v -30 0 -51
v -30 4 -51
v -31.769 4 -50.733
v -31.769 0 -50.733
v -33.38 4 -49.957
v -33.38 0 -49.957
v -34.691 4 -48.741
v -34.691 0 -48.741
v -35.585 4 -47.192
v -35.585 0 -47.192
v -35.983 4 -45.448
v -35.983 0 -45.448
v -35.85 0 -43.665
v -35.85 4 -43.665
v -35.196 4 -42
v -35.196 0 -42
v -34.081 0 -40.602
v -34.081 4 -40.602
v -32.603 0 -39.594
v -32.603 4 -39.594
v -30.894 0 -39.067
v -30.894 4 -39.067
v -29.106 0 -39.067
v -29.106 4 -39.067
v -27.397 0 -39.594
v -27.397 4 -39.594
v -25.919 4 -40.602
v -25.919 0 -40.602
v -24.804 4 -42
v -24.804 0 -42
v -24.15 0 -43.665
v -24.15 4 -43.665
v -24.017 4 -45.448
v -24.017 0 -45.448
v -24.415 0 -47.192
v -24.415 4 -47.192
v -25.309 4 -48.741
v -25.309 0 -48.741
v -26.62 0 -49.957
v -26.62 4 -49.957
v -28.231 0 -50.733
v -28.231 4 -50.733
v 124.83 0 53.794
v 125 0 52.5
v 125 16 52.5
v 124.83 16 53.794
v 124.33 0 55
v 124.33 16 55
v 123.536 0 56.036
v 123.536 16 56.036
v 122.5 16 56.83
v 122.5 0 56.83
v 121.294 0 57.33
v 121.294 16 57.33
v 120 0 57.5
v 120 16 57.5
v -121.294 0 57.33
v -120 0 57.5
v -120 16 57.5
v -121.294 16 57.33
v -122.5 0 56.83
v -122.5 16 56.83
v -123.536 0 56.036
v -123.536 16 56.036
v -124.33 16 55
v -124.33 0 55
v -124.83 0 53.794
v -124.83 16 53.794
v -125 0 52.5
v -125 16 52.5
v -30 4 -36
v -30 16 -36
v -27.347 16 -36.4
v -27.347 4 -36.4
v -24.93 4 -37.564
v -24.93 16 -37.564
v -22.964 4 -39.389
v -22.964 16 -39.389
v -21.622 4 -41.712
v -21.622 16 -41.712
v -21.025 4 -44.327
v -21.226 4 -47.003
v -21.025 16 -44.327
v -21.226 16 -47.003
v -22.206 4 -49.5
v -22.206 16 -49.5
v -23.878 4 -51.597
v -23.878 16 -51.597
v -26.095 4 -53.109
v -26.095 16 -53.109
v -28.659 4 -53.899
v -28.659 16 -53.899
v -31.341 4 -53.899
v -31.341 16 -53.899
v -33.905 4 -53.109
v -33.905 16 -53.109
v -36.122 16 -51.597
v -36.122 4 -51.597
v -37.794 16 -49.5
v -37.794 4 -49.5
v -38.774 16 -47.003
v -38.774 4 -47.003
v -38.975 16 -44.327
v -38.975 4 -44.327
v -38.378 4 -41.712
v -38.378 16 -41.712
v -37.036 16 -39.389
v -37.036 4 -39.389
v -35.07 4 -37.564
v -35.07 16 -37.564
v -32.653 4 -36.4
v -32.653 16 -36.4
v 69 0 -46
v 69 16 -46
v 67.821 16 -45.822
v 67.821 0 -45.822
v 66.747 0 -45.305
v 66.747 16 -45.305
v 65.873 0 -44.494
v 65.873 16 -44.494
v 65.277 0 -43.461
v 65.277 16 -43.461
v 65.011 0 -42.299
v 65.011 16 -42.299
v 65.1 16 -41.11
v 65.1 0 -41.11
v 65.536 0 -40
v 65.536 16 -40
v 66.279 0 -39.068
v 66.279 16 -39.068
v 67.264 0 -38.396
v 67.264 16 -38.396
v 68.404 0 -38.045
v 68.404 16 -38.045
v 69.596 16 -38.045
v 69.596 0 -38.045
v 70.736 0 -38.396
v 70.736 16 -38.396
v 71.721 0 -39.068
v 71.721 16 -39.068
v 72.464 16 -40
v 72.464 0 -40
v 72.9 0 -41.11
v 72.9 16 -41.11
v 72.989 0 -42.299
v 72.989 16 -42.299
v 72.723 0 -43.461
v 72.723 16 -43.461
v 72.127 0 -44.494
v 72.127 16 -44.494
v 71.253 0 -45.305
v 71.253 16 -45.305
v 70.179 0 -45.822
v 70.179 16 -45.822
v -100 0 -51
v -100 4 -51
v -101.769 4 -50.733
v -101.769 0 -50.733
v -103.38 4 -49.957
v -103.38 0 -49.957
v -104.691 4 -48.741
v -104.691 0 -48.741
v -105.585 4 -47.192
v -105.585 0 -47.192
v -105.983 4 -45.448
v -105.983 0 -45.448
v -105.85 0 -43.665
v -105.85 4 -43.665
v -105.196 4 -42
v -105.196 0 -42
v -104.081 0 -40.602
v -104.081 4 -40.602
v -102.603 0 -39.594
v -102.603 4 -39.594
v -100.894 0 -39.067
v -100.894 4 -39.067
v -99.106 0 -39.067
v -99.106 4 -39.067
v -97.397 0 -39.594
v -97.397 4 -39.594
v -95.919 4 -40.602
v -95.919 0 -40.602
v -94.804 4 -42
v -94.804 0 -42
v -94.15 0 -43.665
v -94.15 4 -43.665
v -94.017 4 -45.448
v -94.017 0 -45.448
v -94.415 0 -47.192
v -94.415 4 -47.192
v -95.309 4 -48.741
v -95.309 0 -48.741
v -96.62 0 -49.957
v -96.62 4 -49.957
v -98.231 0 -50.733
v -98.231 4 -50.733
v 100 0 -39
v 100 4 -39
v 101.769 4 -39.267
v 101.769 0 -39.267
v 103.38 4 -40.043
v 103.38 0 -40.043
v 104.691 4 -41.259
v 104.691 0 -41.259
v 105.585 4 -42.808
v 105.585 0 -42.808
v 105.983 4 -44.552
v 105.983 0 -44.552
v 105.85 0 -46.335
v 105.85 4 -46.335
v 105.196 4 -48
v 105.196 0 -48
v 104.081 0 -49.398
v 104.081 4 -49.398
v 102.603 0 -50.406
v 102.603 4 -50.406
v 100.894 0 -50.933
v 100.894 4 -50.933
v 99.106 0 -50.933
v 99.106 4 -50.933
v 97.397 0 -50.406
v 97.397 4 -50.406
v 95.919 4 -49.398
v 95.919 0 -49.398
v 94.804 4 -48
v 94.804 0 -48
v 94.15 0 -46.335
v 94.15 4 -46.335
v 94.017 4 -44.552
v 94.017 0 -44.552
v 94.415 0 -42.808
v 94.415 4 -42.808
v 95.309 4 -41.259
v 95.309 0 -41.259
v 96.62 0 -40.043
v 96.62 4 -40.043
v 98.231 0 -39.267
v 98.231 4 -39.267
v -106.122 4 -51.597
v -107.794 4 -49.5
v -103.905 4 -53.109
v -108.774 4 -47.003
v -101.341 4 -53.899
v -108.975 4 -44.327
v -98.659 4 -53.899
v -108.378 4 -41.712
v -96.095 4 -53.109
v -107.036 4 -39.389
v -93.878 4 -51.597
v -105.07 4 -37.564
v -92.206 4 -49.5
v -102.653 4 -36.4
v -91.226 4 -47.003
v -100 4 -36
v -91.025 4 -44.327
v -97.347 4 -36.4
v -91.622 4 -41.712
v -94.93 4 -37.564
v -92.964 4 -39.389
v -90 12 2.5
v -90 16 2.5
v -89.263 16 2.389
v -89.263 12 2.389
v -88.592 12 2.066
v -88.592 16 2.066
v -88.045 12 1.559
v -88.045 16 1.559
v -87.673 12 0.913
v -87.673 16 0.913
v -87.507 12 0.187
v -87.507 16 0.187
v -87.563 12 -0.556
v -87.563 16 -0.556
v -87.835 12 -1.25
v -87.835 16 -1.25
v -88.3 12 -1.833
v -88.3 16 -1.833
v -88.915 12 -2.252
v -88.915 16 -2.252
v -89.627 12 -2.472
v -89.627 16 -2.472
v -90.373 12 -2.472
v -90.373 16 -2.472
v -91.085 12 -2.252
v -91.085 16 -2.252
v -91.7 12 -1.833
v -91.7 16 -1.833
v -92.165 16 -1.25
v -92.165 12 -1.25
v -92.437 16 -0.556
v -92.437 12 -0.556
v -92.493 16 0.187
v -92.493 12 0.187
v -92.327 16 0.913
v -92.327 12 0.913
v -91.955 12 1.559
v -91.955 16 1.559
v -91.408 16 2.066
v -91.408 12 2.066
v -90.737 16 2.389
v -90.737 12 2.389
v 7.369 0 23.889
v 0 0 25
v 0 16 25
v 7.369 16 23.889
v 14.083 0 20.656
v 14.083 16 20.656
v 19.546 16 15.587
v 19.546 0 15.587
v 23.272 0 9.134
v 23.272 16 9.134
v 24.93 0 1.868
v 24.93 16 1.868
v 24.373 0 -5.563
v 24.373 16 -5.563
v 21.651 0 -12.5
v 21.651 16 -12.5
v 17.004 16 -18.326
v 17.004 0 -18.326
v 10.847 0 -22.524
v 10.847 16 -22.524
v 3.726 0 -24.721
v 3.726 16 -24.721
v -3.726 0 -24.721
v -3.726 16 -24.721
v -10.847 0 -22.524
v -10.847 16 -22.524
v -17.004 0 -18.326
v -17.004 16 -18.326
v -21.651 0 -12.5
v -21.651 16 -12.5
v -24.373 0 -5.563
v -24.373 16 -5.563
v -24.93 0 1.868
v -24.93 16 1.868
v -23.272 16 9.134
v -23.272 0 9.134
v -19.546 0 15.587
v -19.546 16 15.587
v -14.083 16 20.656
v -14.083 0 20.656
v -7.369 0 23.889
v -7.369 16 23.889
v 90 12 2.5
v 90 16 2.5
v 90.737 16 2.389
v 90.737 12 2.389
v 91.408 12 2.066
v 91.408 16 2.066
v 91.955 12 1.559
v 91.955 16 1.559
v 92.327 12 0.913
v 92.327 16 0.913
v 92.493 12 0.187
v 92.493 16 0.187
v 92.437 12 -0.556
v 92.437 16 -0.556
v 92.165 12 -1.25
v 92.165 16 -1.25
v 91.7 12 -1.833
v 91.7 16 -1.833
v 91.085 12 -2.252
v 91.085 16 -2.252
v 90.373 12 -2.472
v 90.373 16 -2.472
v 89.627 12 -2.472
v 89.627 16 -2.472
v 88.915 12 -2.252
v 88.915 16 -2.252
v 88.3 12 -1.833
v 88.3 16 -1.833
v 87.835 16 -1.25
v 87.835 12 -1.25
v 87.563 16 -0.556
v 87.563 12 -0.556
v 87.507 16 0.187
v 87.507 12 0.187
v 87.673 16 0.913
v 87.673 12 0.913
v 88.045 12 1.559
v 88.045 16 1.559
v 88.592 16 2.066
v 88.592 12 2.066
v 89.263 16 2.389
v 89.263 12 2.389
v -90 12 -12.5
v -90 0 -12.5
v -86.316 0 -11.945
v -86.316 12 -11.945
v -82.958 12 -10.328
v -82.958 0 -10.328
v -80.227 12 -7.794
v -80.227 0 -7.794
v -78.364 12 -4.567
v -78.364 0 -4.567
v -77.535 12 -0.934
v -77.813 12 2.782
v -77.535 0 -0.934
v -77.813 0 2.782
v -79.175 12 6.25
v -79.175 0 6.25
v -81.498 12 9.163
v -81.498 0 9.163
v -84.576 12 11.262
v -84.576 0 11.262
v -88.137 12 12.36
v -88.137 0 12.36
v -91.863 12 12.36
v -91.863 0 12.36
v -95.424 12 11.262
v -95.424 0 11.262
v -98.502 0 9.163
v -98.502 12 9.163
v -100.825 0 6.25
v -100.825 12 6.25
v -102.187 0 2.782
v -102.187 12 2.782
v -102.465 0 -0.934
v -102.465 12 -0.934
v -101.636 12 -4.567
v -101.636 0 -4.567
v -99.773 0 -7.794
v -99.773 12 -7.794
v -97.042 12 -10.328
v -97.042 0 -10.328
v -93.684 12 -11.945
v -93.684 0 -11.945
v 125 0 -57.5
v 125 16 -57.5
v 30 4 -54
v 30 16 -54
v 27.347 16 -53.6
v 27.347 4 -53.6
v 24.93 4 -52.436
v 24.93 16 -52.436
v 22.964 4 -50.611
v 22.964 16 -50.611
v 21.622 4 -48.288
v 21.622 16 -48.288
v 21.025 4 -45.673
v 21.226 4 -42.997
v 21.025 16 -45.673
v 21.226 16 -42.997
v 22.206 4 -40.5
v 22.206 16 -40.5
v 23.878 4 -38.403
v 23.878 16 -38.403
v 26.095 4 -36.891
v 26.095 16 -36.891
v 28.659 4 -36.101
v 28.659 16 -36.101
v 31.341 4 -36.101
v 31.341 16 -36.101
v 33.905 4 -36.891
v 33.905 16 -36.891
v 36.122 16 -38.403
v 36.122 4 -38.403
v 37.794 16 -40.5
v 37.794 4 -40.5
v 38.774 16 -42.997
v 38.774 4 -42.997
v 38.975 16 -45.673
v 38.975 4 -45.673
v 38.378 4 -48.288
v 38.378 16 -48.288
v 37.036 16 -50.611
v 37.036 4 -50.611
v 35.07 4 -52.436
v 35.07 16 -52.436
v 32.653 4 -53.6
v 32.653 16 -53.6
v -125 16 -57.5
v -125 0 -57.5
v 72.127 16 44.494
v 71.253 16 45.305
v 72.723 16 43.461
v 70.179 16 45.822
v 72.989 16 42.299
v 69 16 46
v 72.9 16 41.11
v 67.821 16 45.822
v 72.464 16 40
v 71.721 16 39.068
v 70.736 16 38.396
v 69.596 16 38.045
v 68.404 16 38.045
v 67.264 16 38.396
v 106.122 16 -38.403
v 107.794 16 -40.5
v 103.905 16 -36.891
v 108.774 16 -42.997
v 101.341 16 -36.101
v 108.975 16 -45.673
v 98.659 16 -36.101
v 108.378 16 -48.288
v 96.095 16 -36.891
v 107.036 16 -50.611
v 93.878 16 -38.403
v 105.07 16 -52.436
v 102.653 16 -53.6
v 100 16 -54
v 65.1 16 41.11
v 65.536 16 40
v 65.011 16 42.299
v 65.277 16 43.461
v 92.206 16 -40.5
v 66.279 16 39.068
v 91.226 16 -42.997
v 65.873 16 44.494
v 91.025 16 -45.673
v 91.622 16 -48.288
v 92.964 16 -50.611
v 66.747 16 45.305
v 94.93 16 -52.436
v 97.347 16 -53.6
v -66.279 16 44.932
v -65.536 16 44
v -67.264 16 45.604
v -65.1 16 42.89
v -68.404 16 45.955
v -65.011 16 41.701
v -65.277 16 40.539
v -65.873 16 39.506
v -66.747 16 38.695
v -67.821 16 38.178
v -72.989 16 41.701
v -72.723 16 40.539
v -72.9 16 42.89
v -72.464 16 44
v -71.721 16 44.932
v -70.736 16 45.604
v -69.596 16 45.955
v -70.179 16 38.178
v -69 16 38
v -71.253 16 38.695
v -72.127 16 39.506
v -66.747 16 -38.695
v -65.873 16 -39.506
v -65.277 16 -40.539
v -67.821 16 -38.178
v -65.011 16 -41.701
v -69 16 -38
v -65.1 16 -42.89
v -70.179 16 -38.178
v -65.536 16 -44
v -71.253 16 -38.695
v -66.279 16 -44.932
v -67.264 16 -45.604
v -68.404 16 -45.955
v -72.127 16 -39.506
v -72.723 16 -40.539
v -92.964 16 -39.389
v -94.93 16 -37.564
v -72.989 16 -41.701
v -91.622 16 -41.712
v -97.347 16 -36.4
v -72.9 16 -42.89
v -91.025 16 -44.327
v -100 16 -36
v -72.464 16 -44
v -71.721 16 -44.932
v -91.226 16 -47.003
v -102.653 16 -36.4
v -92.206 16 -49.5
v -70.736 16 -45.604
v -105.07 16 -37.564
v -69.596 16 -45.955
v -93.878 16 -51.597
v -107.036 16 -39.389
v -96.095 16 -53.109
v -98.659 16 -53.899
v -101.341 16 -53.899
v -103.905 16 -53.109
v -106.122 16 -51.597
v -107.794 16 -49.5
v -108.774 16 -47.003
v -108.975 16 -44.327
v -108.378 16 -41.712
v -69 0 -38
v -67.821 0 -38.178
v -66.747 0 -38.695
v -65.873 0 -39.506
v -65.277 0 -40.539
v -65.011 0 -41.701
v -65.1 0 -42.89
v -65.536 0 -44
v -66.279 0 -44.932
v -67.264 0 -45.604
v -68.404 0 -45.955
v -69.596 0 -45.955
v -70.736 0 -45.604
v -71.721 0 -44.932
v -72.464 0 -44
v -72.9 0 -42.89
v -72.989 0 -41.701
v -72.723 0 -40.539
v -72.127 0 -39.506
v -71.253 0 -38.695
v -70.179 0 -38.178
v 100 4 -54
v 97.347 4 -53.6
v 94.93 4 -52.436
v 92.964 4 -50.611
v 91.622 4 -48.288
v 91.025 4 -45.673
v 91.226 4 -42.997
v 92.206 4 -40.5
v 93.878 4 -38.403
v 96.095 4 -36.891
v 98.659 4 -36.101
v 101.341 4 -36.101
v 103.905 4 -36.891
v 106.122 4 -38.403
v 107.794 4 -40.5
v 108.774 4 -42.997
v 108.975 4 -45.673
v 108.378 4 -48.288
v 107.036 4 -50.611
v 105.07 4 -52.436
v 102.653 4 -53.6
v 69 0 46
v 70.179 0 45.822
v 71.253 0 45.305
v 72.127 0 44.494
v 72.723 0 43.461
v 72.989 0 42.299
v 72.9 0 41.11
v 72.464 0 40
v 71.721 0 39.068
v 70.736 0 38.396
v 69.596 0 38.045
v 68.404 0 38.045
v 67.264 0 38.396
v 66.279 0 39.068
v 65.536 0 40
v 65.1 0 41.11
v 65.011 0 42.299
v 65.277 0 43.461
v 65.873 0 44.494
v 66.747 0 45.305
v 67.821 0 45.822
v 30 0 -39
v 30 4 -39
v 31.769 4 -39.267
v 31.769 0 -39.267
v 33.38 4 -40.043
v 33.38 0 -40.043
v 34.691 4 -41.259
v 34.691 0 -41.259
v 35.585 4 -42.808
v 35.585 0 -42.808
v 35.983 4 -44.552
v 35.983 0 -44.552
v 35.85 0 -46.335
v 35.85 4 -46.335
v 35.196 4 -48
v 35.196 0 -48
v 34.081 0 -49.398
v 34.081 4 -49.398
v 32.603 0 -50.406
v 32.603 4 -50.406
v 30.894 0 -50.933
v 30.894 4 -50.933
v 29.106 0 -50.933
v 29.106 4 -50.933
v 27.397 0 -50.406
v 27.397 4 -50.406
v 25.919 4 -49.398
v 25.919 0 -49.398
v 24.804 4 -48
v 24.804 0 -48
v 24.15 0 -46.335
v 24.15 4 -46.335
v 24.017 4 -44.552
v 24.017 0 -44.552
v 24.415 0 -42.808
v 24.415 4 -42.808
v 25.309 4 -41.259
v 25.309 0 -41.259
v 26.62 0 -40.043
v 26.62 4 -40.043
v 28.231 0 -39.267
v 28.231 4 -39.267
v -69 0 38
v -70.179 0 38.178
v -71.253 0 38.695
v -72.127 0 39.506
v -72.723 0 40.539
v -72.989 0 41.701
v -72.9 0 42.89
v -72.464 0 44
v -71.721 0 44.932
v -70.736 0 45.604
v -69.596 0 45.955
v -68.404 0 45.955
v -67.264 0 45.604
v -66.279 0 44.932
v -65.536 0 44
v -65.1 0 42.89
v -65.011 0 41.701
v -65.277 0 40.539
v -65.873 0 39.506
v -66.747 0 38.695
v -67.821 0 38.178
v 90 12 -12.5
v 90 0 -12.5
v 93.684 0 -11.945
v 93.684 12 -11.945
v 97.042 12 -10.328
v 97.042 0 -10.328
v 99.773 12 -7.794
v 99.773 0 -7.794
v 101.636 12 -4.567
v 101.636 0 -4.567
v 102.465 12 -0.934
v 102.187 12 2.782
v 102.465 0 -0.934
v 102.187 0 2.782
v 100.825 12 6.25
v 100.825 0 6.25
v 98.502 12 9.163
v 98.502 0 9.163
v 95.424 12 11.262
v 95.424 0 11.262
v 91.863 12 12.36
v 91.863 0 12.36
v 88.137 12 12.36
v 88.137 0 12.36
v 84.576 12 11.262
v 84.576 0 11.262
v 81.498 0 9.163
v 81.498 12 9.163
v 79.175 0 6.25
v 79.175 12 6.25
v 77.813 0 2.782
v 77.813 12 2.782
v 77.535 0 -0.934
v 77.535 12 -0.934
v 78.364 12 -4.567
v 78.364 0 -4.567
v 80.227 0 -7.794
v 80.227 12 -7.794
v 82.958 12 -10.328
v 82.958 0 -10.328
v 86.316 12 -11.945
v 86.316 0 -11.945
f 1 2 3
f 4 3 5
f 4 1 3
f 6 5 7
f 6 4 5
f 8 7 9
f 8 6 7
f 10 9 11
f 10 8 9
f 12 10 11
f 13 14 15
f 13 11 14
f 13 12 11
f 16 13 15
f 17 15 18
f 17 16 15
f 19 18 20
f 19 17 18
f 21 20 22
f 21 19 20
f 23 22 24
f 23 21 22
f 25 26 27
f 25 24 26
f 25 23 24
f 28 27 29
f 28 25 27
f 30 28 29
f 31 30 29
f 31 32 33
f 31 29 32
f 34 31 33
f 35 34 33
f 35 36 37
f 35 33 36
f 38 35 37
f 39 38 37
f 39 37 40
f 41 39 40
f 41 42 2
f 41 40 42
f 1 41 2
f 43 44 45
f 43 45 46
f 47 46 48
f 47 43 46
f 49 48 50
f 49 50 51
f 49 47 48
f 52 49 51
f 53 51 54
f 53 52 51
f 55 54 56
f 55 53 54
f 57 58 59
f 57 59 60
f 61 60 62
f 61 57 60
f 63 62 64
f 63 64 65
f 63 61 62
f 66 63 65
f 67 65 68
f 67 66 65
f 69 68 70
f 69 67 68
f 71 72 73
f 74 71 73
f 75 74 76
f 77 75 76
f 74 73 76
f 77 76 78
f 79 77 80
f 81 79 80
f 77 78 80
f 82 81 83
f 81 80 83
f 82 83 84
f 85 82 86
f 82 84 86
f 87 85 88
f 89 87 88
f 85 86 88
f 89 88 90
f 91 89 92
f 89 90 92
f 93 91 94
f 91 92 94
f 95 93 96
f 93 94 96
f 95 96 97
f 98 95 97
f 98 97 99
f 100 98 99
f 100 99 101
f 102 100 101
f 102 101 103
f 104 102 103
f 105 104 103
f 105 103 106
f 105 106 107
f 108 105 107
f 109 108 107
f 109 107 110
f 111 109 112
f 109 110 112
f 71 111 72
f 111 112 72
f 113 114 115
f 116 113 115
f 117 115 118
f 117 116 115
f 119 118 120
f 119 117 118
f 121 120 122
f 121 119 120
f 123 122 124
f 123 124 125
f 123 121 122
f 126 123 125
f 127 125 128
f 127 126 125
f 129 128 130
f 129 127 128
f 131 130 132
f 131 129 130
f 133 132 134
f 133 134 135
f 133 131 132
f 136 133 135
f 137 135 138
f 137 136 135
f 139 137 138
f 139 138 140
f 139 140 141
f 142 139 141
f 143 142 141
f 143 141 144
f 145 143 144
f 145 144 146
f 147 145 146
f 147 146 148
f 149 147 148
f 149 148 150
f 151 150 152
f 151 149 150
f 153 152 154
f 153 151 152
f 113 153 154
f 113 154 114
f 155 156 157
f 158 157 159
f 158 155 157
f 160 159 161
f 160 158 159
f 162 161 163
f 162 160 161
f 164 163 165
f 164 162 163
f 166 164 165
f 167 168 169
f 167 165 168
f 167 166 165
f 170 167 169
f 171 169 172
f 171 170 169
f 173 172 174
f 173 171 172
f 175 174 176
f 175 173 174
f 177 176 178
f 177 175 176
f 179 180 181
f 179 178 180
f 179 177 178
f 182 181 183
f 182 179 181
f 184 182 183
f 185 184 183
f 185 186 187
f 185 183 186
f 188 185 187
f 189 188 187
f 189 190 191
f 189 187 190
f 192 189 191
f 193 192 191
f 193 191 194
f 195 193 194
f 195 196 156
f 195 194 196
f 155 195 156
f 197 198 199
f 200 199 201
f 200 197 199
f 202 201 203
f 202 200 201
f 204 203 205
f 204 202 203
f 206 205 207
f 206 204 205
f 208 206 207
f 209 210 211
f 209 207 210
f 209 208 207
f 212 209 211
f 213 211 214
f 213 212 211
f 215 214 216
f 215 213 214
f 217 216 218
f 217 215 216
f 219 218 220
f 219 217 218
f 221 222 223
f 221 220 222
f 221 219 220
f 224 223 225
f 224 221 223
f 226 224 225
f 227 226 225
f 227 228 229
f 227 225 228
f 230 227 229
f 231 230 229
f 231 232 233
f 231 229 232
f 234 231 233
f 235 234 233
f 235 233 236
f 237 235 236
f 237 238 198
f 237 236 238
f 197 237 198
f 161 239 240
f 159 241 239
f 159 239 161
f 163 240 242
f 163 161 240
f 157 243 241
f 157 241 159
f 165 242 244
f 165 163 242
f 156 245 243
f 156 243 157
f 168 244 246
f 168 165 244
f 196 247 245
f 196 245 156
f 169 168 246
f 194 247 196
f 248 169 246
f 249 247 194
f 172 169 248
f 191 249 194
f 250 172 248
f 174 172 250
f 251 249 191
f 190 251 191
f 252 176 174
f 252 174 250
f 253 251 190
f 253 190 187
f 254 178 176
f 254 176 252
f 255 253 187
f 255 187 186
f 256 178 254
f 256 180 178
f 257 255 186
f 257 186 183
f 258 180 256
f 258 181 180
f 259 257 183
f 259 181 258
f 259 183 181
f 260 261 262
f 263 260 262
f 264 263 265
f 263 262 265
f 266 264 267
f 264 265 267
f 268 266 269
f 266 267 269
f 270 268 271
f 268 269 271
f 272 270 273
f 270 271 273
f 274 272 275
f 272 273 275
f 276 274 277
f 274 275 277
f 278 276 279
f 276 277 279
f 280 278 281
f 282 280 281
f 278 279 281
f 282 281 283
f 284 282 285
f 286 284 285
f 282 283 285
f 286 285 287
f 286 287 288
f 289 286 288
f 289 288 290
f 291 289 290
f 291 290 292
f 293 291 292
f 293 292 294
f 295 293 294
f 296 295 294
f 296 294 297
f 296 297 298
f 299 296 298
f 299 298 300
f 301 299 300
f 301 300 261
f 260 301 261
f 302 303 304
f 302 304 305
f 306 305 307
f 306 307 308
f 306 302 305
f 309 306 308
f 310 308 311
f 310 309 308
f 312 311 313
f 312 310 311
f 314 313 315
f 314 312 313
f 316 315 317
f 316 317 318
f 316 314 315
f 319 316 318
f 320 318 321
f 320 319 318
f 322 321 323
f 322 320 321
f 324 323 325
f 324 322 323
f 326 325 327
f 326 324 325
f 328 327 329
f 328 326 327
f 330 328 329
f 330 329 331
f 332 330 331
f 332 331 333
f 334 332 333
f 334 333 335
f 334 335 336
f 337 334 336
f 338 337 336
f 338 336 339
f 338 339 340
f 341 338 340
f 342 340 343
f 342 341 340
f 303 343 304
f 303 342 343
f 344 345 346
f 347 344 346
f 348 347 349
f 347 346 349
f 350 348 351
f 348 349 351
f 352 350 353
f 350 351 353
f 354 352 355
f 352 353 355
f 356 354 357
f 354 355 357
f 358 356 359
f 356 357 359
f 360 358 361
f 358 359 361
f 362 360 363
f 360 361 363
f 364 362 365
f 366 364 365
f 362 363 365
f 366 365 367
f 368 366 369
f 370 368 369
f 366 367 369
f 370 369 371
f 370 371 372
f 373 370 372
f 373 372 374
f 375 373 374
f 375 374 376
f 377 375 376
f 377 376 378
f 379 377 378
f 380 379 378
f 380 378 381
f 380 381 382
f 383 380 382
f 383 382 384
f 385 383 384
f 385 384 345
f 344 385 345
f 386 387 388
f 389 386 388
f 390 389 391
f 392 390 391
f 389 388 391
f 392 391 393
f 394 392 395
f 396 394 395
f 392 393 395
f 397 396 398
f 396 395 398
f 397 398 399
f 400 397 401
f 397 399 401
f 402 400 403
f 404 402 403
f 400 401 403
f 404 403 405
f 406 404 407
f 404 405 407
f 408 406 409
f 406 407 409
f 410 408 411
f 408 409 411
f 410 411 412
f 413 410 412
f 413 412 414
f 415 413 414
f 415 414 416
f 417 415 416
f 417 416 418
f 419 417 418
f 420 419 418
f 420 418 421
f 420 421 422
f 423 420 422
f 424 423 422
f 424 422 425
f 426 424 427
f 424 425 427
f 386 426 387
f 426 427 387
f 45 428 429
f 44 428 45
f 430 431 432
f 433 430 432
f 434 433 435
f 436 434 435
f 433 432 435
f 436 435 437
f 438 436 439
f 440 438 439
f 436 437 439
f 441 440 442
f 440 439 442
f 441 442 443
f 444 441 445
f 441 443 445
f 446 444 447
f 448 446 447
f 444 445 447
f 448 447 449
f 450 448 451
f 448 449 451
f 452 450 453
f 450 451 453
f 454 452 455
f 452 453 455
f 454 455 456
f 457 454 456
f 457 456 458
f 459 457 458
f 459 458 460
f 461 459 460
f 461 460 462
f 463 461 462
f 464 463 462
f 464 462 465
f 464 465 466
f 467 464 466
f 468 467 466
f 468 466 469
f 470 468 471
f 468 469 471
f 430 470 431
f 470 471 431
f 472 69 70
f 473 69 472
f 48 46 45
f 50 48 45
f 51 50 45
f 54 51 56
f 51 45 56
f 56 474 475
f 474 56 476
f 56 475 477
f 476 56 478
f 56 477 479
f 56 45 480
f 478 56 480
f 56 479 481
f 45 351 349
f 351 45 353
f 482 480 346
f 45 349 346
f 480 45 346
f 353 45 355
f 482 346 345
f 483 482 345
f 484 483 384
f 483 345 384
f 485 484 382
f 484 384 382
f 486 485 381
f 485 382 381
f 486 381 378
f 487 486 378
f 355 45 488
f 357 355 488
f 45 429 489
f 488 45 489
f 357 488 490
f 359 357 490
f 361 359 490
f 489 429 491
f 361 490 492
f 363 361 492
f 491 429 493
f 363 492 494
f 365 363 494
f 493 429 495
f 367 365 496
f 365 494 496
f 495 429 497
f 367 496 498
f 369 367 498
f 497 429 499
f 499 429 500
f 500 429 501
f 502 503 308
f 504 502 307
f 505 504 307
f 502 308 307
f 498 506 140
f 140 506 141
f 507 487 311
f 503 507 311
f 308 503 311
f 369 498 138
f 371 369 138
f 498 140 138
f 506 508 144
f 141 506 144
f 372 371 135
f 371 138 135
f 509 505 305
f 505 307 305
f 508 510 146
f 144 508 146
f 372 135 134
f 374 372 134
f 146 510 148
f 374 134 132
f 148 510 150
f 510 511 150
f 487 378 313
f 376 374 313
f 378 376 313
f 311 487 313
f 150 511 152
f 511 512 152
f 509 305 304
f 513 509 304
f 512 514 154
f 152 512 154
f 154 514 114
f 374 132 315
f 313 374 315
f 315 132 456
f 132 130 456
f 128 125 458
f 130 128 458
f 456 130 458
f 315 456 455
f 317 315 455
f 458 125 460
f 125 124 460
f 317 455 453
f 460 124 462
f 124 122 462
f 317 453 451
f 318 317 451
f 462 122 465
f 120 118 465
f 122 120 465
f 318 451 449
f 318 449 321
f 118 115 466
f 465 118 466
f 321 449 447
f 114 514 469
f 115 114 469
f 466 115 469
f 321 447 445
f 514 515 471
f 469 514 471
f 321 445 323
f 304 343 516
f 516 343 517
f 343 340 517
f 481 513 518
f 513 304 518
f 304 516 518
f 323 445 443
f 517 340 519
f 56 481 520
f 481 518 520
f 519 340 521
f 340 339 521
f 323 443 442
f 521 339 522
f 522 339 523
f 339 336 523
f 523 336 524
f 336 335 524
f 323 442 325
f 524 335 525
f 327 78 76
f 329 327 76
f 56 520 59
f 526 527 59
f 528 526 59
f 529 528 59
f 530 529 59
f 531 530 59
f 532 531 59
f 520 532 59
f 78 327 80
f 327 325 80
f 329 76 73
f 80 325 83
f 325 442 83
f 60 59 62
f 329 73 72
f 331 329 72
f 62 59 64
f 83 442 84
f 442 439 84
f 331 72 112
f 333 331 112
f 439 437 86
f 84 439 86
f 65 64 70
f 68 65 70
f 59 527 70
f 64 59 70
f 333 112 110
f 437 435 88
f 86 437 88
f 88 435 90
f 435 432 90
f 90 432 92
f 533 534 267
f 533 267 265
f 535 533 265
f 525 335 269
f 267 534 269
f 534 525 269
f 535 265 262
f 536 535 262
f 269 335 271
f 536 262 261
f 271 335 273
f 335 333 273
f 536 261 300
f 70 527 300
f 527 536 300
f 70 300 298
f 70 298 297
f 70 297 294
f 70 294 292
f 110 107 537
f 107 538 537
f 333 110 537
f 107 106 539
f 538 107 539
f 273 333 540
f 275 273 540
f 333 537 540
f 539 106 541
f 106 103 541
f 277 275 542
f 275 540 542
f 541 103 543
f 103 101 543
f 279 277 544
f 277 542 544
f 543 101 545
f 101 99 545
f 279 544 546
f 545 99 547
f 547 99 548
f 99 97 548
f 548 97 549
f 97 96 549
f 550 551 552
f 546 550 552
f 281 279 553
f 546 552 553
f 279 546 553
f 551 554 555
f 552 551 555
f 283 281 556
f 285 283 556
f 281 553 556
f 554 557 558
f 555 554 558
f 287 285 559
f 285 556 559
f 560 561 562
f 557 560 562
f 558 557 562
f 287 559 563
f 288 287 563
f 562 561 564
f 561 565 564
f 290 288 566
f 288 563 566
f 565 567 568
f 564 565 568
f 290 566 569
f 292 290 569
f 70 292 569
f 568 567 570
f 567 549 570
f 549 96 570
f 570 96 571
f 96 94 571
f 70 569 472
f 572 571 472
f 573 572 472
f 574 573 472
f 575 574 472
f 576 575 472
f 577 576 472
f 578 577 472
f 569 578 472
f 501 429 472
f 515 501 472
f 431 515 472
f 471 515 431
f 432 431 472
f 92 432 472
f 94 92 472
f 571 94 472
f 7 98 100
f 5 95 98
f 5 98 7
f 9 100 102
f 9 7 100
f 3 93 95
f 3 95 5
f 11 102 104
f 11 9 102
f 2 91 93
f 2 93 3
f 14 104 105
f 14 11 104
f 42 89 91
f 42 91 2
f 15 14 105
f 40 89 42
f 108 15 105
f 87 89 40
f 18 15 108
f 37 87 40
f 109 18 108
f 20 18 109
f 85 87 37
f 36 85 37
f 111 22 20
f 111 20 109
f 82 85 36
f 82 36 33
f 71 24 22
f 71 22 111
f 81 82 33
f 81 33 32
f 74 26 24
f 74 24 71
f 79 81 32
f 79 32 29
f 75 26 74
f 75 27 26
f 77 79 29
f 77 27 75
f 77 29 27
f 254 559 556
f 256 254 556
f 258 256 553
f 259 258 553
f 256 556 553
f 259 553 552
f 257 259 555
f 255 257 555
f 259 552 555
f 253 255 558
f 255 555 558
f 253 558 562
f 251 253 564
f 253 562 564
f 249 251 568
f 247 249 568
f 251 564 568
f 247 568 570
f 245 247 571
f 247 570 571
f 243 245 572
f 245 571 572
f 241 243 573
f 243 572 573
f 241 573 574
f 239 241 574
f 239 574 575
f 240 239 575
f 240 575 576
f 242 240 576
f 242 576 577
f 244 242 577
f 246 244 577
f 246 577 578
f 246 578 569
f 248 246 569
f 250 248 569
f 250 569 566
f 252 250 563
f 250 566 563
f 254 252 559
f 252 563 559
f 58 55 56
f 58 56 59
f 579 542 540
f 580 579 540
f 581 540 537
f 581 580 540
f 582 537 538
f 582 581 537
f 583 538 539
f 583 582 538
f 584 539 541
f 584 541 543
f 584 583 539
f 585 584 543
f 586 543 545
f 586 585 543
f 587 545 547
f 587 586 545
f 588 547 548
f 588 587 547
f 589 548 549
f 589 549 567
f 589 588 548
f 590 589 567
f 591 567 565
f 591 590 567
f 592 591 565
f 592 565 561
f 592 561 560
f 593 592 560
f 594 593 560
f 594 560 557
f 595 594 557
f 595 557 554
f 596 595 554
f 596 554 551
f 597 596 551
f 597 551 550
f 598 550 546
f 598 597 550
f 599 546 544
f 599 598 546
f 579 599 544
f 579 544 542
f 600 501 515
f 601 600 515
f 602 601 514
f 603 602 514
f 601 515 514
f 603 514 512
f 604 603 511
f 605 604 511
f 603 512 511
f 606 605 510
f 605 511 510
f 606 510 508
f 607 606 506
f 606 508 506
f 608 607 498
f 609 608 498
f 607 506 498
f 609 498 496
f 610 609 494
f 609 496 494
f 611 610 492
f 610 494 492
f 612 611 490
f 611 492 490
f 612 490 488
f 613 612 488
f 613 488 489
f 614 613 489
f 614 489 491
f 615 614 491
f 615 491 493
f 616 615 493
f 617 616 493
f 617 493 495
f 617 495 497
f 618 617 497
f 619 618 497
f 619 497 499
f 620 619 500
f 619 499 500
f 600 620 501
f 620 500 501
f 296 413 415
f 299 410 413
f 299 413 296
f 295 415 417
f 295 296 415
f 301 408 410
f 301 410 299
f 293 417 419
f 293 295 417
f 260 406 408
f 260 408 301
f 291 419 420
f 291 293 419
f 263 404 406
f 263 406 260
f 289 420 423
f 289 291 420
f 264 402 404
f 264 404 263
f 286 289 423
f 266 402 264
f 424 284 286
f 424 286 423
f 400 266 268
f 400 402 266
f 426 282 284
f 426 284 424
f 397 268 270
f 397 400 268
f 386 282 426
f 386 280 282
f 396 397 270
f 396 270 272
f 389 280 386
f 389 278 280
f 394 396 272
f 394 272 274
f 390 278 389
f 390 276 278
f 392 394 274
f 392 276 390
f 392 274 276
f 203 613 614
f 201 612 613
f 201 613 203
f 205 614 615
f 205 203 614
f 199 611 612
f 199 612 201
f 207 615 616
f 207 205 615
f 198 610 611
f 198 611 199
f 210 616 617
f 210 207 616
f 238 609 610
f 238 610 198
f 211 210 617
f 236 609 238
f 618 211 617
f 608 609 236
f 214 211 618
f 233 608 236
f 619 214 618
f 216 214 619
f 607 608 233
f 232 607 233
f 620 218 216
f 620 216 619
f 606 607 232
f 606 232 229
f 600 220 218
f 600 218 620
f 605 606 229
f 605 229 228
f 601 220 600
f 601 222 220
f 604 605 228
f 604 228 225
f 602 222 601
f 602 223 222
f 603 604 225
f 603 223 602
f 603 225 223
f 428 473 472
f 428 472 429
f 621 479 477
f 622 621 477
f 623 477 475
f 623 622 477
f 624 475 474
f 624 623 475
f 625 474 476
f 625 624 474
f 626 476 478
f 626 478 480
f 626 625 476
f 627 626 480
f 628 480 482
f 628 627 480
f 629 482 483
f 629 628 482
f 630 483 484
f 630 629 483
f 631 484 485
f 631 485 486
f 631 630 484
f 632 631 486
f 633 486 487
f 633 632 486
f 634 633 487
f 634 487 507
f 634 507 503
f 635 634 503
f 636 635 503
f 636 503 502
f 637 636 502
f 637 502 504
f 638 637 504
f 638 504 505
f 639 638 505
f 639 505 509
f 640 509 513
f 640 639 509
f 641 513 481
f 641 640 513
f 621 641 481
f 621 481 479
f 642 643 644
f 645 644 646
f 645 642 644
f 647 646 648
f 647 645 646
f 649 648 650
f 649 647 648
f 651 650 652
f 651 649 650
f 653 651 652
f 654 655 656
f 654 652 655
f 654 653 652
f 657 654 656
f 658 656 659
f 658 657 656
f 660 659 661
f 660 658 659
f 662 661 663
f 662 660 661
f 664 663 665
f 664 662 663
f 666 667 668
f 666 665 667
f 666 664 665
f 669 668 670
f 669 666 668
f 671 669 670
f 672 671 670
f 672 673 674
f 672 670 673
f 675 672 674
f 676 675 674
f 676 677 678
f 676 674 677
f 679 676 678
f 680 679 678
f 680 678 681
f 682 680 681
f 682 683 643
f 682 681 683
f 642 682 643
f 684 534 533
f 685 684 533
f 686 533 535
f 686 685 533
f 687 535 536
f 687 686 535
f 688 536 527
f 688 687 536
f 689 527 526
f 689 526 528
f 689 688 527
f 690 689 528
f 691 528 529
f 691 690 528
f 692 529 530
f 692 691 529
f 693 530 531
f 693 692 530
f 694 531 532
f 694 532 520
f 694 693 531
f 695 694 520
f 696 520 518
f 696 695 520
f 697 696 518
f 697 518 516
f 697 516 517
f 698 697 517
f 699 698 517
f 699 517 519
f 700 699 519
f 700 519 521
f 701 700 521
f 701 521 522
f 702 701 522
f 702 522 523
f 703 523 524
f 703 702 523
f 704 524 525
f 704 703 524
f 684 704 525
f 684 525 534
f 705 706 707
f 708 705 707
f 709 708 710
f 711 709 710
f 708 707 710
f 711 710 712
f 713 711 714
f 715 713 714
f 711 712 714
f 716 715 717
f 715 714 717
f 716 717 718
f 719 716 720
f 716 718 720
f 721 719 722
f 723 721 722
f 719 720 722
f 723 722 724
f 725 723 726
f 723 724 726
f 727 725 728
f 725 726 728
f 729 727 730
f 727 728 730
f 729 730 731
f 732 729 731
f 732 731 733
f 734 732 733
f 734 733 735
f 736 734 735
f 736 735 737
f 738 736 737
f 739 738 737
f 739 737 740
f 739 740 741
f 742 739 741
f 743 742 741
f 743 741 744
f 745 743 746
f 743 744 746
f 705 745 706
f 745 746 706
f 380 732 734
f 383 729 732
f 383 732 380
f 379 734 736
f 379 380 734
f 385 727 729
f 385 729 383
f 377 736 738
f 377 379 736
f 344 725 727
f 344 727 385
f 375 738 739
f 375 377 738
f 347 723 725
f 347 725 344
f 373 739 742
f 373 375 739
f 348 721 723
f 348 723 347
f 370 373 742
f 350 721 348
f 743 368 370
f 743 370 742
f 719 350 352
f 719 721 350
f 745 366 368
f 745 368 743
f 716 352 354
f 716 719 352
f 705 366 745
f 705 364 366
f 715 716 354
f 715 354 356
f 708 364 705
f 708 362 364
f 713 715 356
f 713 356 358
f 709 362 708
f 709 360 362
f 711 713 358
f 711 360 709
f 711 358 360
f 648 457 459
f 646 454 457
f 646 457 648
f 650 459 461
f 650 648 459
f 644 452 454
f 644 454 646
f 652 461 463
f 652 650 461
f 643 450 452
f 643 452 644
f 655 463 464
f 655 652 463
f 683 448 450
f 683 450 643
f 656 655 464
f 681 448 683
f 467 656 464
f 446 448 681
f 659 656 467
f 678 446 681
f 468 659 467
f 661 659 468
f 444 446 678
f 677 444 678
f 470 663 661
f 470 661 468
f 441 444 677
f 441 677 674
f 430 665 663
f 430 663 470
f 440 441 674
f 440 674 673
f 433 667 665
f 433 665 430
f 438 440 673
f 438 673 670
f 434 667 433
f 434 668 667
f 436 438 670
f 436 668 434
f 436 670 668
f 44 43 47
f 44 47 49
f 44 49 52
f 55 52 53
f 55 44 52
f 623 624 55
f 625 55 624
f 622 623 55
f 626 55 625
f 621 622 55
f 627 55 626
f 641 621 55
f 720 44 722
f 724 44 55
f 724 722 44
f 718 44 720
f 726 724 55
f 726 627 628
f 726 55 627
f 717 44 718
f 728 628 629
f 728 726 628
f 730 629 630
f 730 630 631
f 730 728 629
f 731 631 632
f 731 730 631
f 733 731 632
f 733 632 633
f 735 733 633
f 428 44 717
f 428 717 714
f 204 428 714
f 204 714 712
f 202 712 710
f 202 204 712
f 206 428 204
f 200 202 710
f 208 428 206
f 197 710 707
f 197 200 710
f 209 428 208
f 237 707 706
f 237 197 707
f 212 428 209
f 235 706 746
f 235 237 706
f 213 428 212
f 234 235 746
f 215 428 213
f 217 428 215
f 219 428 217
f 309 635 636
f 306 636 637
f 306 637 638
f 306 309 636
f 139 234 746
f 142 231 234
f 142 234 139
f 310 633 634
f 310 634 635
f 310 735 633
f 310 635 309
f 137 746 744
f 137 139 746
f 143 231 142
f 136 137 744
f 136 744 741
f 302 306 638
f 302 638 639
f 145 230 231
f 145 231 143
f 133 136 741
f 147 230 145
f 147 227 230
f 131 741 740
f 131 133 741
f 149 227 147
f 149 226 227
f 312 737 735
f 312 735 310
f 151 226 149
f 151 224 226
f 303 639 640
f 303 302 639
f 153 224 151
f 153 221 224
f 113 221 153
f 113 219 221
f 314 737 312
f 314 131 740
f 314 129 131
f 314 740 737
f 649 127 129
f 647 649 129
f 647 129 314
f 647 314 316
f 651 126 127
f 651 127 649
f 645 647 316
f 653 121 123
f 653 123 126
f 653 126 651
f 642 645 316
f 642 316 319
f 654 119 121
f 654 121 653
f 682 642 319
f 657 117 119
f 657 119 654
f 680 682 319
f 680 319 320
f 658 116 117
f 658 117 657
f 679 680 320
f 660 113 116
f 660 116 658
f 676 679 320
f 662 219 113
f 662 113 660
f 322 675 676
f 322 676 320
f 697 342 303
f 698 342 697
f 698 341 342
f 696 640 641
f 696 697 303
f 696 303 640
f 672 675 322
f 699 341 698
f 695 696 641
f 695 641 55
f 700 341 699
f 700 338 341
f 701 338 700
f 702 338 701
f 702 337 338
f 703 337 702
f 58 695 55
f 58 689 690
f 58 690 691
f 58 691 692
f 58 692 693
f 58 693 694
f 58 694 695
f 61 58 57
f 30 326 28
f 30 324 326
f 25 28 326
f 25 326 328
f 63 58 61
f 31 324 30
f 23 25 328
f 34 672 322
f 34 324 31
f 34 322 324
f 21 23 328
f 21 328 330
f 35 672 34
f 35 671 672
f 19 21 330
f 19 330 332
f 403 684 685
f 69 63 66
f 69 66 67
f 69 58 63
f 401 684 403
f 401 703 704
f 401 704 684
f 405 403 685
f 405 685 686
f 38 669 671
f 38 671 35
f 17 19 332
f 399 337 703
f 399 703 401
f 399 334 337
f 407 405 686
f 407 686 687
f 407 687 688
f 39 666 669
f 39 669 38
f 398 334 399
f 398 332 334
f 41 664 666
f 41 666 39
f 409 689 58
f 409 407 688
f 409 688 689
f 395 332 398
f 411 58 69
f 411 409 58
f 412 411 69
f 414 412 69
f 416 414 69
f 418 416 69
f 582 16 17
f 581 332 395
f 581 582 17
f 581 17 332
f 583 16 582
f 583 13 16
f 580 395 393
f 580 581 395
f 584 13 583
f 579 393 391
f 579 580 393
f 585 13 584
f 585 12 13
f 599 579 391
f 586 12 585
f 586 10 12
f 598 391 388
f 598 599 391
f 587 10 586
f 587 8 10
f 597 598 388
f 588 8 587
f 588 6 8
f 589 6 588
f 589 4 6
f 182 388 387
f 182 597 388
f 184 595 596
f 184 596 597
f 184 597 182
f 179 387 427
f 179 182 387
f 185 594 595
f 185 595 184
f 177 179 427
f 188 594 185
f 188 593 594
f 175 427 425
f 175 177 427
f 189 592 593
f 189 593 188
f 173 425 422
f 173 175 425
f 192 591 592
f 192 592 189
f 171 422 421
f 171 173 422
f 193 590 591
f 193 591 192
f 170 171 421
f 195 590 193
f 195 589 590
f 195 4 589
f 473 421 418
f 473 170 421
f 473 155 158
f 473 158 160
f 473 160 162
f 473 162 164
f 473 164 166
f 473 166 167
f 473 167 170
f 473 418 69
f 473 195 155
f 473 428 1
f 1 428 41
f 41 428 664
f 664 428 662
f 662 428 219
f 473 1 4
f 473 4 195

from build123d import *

# Parameters (mm, degrees)
SKETCH_1_R          = 25
SKETCH_1_R_2        = 4
SKETCH_1_R_3        = 6
EXTRUDE_1_DEPTH     = 16
SKETCH_2_R          = 9
CUT_EXTRUDE_1_DEPTH = 12
SKETCH_3_R          = 2.5
CUT_EXTRUDE_2_DEPTH = 41
SKETCH_4_R          = 12.5
CUT_EXTRUDE_3_DEPTH = 12


with BuildPart() as part:
    # 草图1 → 凸台-拉伸1 (new body)
    with BuildSketch(Plane(origin=(0, 0, 0), x_dir=(1, 0, 0), z_dir=(0, 1, 0))):
        with BuildLine():
            Line((-125, 57.5), (125, 57.5))
            Line((125, 57.5), (125, -52.5))
            ThreePointArc((125, -52.5), (123.535533906, -56.035533906), (120, -57.5))
            Line((120, -57.5), (-120, -57.5))
            ThreePointArc((-120, -57.5), (-123.535533906, -56.035533906), (-125, -52.5))
            Line((-125, -52.5), (-125, 57.5))
        make_face()
        with Locations(Location((0, 0, 0), (0, 0, 270))):
            Circle(SKETCH_1_R, mode=Mode.SUBTRACT)
        with Locations(Location((69, -42, 0), (0, 0, 270))):
            Circle(SKETCH_1_R_2, mode=Mode.SUBTRACT)
        with Locations(Location((69, 42, 0), (0, 0, 90))):
            Circle(SKETCH_1_R_2, mode=Mode.SUBTRACT)
        with Locations(Location((-69, -42, 0), (0, 0, 90))):
            Circle(SKETCH_1_R_2, mode=Mode.SUBTRACT)
        with Locations(Location((-69, 42, 0), (0, 0, 270))):
            Circle(SKETCH_1_R_2, mode=Mode.SUBTRACT)
        with Locations(Location((30, 45, 0), (0, 0, 270))):
            Circle(SKETCH_1_R_3, mode=Mode.SUBTRACT)
        with Locations(Location((100, 45, 0), (0, 0, 270))):
            Circle(SKETCH_1_R_3, mode=Mode.SUBTRACT)
        with Locations(Location((-100, 45, 0), (0, 0, 90))):
            Circle(SKETCH_1_R_3, mode=Mode.SUBTRACT)
        with Locations(Location((-30, 45, 0), (0, 0, 90))):
            Circle(SKETCH_1_R_3, mode=Mode.SUBTRACT)
    extrude(amount=EXTRUDE_1_DEPTH)

    # 草图2 → 切除-拉伸1 (cut)
    with BuildSketch(Plane(origin=(0, 16, 0), x_dir=(1, 0, 0), z_dir=(0, 1, 0))):
        with Locations(Location((-100, 45, 0), (0, 0, 270))):
            Circle(SKETCH_2_R)
        with Locations(Location((-30, 45, 0), (0, 0, 270))):
            Circle(SKETCH_2_R)
        with Locations(Location((30, 45, 0), (0, 0, 90))):
            Circle(SKETCH_2_R)
        with Locations(Location((100, 45, 0), (0, 0, 90))):
            Circle(SKETCH_2_R)
    extrude(amount=-CUT_EXTRUDE_1_DEPTH, mode=Mode.SUBTRACT)

    # 草图3 → 切除-拉伸2 (cut)
    with BuildSketch(Plane(origin=(0, 16, 0), x_dir=(1, 0, 0), z_dir=(0, 1, 0))):
        with Locations(Location((-90, 0, 0), (0, 0, 270))):
            Circle(SKETCH_3_R)
        with Locations(Location((90, 0, 0), (0, 0, 270))):
            Circle(SKETCH_3_R)
    extrude(amount=-CUT_EXTRUDE_2_DEPTH, mode=Mode.SUBTRACT)

    # 草图4 → 切除-拉伸3 (cut)
    with BuildSketch(Plane.XZ):
        with Locations(Location((-90, 0, 0), (0, 0, 270))):
            Circle(SKETCH_4_R)
        with Locations(Location((90, 0, 0), (0, 0, 270))):
            Circle(SKETCH_4_R)
    extrude(amount=-CUT_EXTRUDE_3_DEPTH, mode=Mode.SUBTRACT)


solid = part.part
